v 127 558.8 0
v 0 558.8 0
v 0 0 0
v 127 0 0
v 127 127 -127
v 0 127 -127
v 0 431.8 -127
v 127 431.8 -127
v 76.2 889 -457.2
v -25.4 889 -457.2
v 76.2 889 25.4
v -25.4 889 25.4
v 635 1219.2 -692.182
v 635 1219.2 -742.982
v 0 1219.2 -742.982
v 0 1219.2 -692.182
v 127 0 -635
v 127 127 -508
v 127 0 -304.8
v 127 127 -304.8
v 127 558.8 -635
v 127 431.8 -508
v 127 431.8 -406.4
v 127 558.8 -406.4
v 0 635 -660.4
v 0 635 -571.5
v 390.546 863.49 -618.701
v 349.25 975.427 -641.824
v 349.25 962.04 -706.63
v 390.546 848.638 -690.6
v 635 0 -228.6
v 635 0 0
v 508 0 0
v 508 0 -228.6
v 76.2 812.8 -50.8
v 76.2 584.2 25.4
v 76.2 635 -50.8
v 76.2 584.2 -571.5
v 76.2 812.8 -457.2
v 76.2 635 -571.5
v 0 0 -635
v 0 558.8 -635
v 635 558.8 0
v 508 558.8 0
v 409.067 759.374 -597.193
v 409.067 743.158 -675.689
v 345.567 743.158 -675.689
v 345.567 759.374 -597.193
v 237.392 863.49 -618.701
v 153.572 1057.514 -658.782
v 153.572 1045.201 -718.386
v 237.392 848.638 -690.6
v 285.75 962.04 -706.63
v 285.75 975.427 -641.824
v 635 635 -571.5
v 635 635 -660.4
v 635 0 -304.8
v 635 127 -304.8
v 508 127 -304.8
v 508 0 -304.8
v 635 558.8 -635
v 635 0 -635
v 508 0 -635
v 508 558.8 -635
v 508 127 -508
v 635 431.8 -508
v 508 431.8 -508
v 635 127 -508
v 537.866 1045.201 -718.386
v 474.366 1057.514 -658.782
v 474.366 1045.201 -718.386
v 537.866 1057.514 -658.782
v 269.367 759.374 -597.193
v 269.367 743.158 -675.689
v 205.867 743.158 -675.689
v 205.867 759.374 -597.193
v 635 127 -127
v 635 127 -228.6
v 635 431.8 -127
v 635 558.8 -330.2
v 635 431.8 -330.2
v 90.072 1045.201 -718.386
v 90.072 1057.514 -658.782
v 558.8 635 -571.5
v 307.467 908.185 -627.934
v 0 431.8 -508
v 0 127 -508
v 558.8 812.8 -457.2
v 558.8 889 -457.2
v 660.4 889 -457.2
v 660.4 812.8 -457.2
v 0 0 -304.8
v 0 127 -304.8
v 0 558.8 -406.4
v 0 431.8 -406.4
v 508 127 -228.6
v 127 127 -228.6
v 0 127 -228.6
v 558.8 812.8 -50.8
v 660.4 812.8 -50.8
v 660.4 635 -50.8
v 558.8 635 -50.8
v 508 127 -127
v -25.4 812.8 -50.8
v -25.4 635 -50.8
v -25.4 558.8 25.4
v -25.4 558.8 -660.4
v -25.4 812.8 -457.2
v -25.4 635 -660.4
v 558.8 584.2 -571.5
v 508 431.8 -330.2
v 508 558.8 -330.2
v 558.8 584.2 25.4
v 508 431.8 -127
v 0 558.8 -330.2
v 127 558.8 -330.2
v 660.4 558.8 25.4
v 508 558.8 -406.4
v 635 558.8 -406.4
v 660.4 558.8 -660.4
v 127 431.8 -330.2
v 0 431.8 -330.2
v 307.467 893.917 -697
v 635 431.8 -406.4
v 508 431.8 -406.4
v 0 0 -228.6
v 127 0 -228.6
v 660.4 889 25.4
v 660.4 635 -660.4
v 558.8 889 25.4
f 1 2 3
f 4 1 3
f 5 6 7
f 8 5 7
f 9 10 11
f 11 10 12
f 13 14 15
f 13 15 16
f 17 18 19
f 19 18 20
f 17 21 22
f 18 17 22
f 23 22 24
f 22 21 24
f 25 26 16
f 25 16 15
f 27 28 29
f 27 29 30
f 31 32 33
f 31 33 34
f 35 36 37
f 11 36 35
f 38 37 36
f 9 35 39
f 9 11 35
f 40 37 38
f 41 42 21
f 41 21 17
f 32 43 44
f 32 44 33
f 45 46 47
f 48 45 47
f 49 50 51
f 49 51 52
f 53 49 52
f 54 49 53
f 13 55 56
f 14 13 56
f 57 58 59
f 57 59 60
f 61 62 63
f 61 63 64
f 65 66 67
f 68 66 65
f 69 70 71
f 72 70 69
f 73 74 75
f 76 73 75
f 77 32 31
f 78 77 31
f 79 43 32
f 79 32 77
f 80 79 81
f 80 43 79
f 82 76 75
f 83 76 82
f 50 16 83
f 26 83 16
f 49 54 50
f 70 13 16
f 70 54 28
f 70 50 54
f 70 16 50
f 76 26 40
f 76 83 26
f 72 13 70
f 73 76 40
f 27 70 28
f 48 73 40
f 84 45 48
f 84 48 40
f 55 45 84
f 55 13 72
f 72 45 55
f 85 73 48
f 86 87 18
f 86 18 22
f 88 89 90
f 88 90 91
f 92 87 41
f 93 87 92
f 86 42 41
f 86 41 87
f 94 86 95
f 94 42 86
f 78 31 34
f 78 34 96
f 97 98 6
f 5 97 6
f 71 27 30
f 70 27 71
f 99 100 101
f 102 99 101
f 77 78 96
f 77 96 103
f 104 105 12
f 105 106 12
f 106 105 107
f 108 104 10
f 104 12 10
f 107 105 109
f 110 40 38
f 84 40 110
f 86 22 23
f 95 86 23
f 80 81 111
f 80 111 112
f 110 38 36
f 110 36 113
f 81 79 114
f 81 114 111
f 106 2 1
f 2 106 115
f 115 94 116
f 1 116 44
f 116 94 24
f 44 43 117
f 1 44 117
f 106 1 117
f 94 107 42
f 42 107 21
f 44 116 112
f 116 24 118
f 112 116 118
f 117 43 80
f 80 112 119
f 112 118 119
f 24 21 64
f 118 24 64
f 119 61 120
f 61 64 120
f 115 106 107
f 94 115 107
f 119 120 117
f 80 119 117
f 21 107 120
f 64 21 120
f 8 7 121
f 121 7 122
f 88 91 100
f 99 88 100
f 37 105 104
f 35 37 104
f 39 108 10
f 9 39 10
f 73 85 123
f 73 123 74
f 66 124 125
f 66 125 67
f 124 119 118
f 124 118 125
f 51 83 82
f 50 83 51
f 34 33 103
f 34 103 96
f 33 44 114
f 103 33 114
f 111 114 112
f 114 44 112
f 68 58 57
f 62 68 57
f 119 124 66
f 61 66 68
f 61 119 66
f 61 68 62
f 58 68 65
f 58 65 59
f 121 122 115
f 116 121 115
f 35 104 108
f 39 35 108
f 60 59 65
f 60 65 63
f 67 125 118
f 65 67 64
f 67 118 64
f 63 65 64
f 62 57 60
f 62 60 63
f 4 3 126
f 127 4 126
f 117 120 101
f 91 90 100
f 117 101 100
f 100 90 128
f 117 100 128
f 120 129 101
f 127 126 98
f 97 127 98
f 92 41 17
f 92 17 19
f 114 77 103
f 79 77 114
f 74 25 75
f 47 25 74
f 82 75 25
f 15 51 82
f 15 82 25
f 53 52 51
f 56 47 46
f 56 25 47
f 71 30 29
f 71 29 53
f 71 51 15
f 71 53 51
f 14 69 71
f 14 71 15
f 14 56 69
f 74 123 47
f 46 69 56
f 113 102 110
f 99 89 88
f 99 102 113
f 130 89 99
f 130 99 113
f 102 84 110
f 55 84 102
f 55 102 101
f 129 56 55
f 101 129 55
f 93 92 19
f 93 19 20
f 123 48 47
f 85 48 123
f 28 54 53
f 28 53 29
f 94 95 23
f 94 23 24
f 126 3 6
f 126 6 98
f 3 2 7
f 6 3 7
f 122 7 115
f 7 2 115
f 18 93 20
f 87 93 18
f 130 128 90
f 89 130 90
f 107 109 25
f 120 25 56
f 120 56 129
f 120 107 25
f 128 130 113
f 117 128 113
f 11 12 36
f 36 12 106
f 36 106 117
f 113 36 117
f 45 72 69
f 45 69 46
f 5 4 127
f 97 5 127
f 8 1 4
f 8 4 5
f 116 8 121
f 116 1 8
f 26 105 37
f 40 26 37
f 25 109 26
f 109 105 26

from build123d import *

# Parameters (mm, degrees)
BOSS_EXTRUDE1_DEPTH   = 127
BOSS_EXTRUDE1_2_DEPTH = 127
BOSS_EXTRUDE7_DEPTH   = 127
BOSS_EXTRUDE7_2_DEPTH = 127
SKETCH10_W            = 685.8
SKETCH10_H            = 685.8
BOSS_EXTRUDE8_DEPTH   = 76.2
SKETCH11_W            = 482.6
SKETCH11_H            = 596.9
CUT_EXTRUDE3_DEPTH    = 50.8
BOSS_EXTRUDE9_DEPTH   = 635
BOSS_EXTRUDE11_DEPTH  = 101.6
BOSS_EXTRUDE12_DEPTH  = 101.6
CUT_EXTRUDE4_DEPTH    = 1531.798988842


with BuildPart() as part:
    # Sketch1 → Boss-Extrude1 (new body)
    with BuildSketch(Plane(origin=(0, 0, 0), x_dir=(0, 0, -1), z_dir=(1, 0, 0))):
        Polygon((0, 0), (228.6, 0), (228.6, 127), (127, 127), (127, 431.8), (330.2, 431.8), (330.2, 558.8), (0, 558.8), align=None)
    extrude(amount=BOSS_EXTRUDE1_DEPTH)



with BuildPart() as body_2:
    # Sketch1 → Boss-Extrude1 2 (new body)
    with BuildSketch(Plane(origin=(0, 0, 0), x_dir=(0, 0, -1), z_dir=(1, 0, 0))):
        Polygon((635, 558.8), (635, 0), (304.8, 0), (304.8, 127), (508, 127), (508, 431.8), (406.4, 431.8), (406.4, 558.8), align=None)
    extrude(amount=BOSS_EXTRUDE1_2_DEPTH)


with BuildPart() as body_3:
    # Sketch9 → Boss-Extrude7 (new body)
    with BuildSketch(Plane(origin=(635, 0, 0), x_dir=(0, 0, -1), z_dir=(1, 0, 0))):
        Polygon((127, 431.8), (330.2, 431.8), (330.2, 558.8), (0, 558.8), (0, 0), (228.6, 0), (228.6, 127), (127, 127), align=None)
    extrude(amount=-BOSS_EXTRUDE7_DEPTH)


with BuildPart() as body_4:
    # Sketch9 → Boss-Extrude7 2 (new body)
    with BuildSketch(Plane(origin=(635, 0, 0), x_dir=(0, 0, -1), z_dir=(1, 0, 0))):
        Polygon((406.4, 558.8), (406.4, 431.8), (508, 431.8), (508, 127), (304.8, 127), (304.8, 0), (635, 0), (635, 558.8), align=None)
    extrude(amount=-BOSS_EXTRUDE7_2_DEPTH)


with BuildPart() as part_1:
    add(part.part)

    add(body_2.part)  # Boss-Extrude8 merges body 2

    add(body_3.part)  # Boss-Extrude8 merges body 3

    add(body_4.part)  # Boss-Extrude8 merges body 4
    # Sketch10 → Boss-Extrude8 (add)
    with BuildSketch(Plane(origin=(0, 558.8, 0), x_dir=(1, 0, 0), z_dir=(0, 1, 0))):
        with Locations((317.5, 317.5)):
            Rectangle(SKETCH10_W, SKETCH10_H)
    extrude(amount=BOSS_EXTRUDE8_DEPTH)

    # Sketch11 → Cut-Extrude3 (cut)
    with BuildSketch(Plane(origin=(0, 635, 0), x_dir=(1, 0, 0), z_dir=(0, 1, 0))):
        with Locations((317.5, 273.05)):
            Rectangle(SKETCH11_W, SKETCH11_H)
    extrude(amount=-CUT_EXTRUDE3_DEPTH, mode=Mode.SUBTRACT)

    # Sketch13 → Boss-Extrude9 (add)
    with BuildSketch(Plane(origin=(635, 0, 0), x_dir=(0, 0, -1), z_dir=(1, 0, 0))):
        Polygon((660.4, 635), (742.98211211, 1219.2), (692.18211211, 1219.2), (571.5, 635), align=None)
    extrude(amount=-BOSS_EXTRUDE9_DEPTH)

    # Sketch15 → Boss-Extrude11 (add)
    with BuildSketch(Plane(origin=(660.4, 0, 0), x_dir=(0, 0, -1), z_dir=(1, 0, 0))):
        Polygon((-25.4, 635), (-25.4, 889), (457.2, 889), (457.2, 812.8), (50.8, 812.8), (50.8, 635), align=None)
    extrude(amount=-BOSS_EXTRUDE11_DEPTH)

    # Sketch16 → Boss-Extrude12 (add)
    with BuildSketch(Plane(origin=(-25.4, 0, 0), x_dir=(0, 0, -1), z_dir=(1, 0, 0))):
        Polygon((50.8, 635), (50.8, 812.8), (457.2, 812.8), (457.2, 889), (-25.4, 889), (-25.4, 635), align=None)
    extrude(amount=BOSS_EXTRUDE12_DEPTH)

    # Sketch17 → Cut-Extrude4 (cut, through all)
    with BuildSketch(Plane(origin=(0, -87.23785604, -422.302482176), x_dir=(1, 0, 0), z_dir=(0, 0.20230522100715992, 0.9793225196804392))):
        Polygon((90.072307692, 1168.922071162), (153.572307692, 1168.922071162), (237.392307692, 970.802071162), (285.75, 1085.102071162), (349.25, 1085.102071162), (390.546160735, 970.802071162), (474.366160735, 1168.922071162), (537.866160735, 1168.922071162), (409.066806467, 864.487233803), (345.566806467, 864.487233803), (307.466806467, 1016.440282577), (269.366806467, 864.487233803), (205.866806467, 864.487233803), align=None)
    extrude(amount=-CUT_EXTRUDE4_DEPTH, mode=Mode.SUBTRACT)


solid = part_1.part
